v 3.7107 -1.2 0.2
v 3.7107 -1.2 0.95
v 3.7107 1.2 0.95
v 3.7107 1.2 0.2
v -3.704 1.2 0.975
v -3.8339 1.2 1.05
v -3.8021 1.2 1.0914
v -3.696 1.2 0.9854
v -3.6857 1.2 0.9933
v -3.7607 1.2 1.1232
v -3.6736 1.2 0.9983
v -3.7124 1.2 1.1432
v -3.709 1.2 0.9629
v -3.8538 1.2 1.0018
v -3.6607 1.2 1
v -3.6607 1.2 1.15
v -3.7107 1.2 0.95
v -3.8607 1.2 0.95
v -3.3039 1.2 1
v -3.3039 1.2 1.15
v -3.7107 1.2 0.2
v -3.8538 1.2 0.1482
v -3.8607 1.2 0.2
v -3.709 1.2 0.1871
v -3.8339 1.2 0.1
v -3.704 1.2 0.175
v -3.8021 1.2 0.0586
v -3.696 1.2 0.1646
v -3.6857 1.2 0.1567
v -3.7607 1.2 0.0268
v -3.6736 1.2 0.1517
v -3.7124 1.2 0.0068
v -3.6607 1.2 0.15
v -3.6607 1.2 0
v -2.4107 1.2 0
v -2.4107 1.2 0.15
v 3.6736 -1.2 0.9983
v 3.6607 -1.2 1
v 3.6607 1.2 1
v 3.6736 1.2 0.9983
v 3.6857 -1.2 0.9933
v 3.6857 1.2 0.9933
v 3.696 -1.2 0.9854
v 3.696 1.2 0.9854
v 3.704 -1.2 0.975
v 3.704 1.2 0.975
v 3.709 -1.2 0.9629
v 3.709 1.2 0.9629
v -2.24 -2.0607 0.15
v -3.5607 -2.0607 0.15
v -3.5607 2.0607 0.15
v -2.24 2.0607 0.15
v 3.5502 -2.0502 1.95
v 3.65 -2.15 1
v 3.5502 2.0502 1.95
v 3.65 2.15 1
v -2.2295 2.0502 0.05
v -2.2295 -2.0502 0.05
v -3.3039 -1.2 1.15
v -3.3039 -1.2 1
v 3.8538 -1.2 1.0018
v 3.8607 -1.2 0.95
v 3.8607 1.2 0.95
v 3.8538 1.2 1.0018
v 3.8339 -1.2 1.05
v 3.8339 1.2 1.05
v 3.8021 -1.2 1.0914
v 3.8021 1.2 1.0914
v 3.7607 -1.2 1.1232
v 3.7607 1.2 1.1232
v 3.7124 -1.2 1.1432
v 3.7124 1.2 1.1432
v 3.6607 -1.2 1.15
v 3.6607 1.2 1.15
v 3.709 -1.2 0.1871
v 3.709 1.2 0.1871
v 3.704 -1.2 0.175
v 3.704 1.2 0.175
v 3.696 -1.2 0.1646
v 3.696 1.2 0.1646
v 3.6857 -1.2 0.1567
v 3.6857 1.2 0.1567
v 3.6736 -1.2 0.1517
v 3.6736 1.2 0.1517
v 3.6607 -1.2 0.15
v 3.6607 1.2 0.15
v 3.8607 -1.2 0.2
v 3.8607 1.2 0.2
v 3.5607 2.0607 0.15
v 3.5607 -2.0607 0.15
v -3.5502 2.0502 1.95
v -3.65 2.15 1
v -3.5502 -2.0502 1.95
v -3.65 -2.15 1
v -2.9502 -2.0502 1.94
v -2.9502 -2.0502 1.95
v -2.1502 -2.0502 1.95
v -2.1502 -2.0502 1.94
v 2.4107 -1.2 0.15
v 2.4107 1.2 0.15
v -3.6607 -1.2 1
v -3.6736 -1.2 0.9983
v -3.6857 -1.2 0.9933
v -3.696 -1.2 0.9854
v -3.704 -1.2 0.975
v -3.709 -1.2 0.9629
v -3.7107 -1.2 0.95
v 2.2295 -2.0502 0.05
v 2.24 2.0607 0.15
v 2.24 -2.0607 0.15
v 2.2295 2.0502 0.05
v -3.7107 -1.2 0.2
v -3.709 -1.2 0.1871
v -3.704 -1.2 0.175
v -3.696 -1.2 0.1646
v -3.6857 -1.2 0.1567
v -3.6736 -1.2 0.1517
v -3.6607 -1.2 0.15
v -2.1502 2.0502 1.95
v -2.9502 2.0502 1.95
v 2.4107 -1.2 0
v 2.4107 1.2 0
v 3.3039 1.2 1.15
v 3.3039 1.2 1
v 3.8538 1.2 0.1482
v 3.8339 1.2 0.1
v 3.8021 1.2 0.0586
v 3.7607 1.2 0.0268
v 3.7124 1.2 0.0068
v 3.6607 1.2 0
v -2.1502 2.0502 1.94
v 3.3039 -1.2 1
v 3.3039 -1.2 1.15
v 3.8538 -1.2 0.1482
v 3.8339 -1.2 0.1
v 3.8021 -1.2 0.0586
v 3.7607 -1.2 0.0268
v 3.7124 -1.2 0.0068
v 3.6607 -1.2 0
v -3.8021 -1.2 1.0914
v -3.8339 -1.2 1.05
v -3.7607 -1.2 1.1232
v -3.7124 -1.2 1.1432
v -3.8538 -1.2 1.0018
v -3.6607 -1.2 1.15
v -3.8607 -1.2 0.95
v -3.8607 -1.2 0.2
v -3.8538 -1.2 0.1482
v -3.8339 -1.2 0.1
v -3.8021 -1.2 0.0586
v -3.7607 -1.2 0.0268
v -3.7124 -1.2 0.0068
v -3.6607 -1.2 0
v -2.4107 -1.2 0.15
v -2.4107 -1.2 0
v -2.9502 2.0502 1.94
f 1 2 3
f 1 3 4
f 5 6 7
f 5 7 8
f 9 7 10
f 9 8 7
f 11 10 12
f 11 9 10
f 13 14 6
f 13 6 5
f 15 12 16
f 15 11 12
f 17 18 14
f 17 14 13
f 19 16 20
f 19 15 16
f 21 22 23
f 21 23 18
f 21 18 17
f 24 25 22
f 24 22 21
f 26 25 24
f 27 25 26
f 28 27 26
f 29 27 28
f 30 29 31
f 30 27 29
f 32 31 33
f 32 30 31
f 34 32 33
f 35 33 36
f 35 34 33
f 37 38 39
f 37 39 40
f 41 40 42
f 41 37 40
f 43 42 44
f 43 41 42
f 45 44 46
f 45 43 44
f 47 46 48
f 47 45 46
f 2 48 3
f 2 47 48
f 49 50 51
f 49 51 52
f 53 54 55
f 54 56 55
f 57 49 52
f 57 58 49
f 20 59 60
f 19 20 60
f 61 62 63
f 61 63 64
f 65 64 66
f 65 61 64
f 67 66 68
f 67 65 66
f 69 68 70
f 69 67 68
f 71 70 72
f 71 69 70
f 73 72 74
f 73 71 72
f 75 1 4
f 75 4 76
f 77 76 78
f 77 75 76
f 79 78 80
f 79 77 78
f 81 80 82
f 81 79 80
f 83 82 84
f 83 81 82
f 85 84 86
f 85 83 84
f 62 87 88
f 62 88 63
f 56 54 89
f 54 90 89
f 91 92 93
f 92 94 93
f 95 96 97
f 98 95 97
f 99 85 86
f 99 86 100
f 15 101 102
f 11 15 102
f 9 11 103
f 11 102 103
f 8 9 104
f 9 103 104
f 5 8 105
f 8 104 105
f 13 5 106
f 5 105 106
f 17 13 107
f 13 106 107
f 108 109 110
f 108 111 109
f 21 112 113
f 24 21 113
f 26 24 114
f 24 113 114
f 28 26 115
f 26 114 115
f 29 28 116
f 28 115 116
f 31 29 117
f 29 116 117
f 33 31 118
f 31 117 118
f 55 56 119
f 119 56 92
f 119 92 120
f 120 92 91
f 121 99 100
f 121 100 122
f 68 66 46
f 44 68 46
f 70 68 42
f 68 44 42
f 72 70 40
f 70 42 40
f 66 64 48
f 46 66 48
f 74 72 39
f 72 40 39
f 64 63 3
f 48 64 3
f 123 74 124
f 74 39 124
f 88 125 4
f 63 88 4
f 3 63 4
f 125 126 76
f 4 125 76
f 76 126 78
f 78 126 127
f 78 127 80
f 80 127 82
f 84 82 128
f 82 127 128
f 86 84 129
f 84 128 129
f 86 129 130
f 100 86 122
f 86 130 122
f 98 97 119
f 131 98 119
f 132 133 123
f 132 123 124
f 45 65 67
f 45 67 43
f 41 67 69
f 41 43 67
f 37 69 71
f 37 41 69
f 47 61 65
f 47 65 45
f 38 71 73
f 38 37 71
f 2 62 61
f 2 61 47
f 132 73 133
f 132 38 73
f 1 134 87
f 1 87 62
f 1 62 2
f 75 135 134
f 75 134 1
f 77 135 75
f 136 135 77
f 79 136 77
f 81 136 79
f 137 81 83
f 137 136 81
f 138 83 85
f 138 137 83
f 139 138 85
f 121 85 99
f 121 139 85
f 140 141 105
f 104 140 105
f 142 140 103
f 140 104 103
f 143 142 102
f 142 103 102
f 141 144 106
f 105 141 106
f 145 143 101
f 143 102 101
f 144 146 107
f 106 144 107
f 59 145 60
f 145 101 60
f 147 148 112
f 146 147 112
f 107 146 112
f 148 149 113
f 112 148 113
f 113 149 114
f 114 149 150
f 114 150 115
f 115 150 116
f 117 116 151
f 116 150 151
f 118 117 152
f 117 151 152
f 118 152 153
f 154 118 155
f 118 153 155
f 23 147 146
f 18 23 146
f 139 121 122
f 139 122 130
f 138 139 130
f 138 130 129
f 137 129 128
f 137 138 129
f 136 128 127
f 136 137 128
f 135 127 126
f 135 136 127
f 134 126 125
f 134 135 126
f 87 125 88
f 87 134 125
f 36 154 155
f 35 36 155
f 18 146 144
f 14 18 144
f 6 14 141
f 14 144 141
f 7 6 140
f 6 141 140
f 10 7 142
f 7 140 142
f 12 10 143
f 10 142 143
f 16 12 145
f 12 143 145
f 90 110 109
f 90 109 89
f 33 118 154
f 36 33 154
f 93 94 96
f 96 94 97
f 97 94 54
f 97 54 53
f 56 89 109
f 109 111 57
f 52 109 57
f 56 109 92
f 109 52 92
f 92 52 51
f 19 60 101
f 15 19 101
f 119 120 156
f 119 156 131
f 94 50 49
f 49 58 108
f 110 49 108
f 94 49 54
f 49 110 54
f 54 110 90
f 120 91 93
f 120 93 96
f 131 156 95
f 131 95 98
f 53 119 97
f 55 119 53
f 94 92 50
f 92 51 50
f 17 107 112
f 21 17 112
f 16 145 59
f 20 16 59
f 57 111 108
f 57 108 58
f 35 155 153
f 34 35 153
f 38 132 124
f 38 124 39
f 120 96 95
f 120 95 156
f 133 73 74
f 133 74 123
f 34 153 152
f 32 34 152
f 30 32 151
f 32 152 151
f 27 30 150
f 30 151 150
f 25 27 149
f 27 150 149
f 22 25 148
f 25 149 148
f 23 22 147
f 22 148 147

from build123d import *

# Parameters (mm, degrees)
SKETCH_1_W                  = 7.3
SKETCH_1_H                  = 4.3
EXTRUDE_1_DEPTH             = 0.95
EXTRUDE_1_TAPER             = 6
EXTRUDE_1_OTHER_WAY_DEPTH   = 0.85
EXTRUDE_1_OTHER_WAY_TAPER   = 6
SM_BASE_FLANGE_1_DEPTH      = 1.2
SM_BASE_FLANGE_1_DEPTH_BACK = 1.2
SKETCH_10_W                 = 4.48
SKETCH_10_H                 = 4.1213228
EXTRUDE_2_DEPTH             = 0.1
EXTRUDE_2_TAPER             = 6
SKETCH_12_W                 = 0.8
SKETCH_12_H                 = 4.100301952
CUT_EXTRUDE_1_DEPTH         = 0.01


# Sheet-metal steps are written as plain solids
with BuildPart() as part:
    # Sketch 1 → Бобышка-Вытянуть1 (new body)
    with BuildSketch(Plane.XY.offset(1)):
        Rectangle(SKETCH_1_W, SKETCH_1_H)
    extrude(amount=EXTRUDE_1_DEPTH, taper=EXTRUDE_1_TAPER)

    # Sketch 1 → Бобышка-Вытянуть1 other way (add)
    with BuildSketch(Plane.XY.offset(1)):
        Rectangle(SKETCH_1_W, SKETCH_1_H)
    extrude(amount=-EXTRUDE_1_OTHER_WAY_DEPTH, taper=EXTRUDE_1_OTHER_WAY_TAPER)

    # Эскиз10 → Бобышка-Вытянуть2 (add)
    with BuildSketch(Plane(origin=(0, 0, 0.15), x_dir=(-1, 0, 0), z_dir=(0, 0, -1))):
        Rectangle(SKETCH_10_W, SKETCH_10_H)
    extrude(amount=EXTRUDE_2_DEPTH, taper=EXTRUDE_2_TAPER)

    # Эскиз12 → Вырез-Вытянуть1 (cut)
    with BuildSketch(Plane.XY.offset(1.95)):
        with Locations((-2.550150976, 0)):
            Rectangle(SKETCH_12_W, SKETCH_12_H)
    extrude(amount=-CUT_EXTRUDE_1_DEPTH, mode=Mode.SUBTRACT)


with BuildPart() as body_2:
    # Sketch 3 → Базовая кромка1 (new, two sides: drawn at the far end of the back side and taken through both)
    with BuildSketch(Plane(origin=(0, 0, 0), x_dir=(1, 0, 0), z_dir=(0, 1, 0)).offset(-SM_BASE_FLANGE_1_DEPTH_BACK)):
        with BuildLine():
            Line((-3.303882397, -1), (-3.6606614, -1))
            ThreePointArc((-3.6606614, -1), (-3.696016739, -0.985355339), (-3.7106614, -0.95))
            Line((-3.7106614, -0.95), (-3.7106614, -0.2))
            ThreePointArc((-3.7106614, -0.2), (-3.696016739, -0.164644661), (-3.6606614, -0.15))
            Line((-3.6606614, -0.15), (-2.4106614, -0.15))
            Line((-2.4106614, -0.15), (-2.4106614, 0))
            Line((-2.4106614, 0), (-3.6606614, 0))
            ThreePointArc((-3.6606614, 0), (-3.802082756, -0.058578644), (-3.8606614, -0.2))
            Line((-3.8606614, -0.2), (-3.8606614, -0.95))
            ThreePointArc((-3.8606614, -0.95), (-3.802082756, -1.091421356), (-3.6606614, -1.15))
            Line((-3.6606614, -1.15), (-3.303882397, -1.15))
            Line((-3.303882397, -1.15), (-3.303882397, -1))
        make_face()
    extrude(amount=SM_BASE_FLANGE_1_DEPTH + SM_BASE_FLANGE_1_DEPTH_BACK)


with BuildPart() as body_3:
    # Зеркальное отражение1: mirrored copy
    add(body_2.part.mirror(Plane(origin=(0, 0, 0), x_dir=(0, 0, 1), z_dir=(1, 0, 0))))


solid = Compound([part.part, body_2.part, body_3.part])
